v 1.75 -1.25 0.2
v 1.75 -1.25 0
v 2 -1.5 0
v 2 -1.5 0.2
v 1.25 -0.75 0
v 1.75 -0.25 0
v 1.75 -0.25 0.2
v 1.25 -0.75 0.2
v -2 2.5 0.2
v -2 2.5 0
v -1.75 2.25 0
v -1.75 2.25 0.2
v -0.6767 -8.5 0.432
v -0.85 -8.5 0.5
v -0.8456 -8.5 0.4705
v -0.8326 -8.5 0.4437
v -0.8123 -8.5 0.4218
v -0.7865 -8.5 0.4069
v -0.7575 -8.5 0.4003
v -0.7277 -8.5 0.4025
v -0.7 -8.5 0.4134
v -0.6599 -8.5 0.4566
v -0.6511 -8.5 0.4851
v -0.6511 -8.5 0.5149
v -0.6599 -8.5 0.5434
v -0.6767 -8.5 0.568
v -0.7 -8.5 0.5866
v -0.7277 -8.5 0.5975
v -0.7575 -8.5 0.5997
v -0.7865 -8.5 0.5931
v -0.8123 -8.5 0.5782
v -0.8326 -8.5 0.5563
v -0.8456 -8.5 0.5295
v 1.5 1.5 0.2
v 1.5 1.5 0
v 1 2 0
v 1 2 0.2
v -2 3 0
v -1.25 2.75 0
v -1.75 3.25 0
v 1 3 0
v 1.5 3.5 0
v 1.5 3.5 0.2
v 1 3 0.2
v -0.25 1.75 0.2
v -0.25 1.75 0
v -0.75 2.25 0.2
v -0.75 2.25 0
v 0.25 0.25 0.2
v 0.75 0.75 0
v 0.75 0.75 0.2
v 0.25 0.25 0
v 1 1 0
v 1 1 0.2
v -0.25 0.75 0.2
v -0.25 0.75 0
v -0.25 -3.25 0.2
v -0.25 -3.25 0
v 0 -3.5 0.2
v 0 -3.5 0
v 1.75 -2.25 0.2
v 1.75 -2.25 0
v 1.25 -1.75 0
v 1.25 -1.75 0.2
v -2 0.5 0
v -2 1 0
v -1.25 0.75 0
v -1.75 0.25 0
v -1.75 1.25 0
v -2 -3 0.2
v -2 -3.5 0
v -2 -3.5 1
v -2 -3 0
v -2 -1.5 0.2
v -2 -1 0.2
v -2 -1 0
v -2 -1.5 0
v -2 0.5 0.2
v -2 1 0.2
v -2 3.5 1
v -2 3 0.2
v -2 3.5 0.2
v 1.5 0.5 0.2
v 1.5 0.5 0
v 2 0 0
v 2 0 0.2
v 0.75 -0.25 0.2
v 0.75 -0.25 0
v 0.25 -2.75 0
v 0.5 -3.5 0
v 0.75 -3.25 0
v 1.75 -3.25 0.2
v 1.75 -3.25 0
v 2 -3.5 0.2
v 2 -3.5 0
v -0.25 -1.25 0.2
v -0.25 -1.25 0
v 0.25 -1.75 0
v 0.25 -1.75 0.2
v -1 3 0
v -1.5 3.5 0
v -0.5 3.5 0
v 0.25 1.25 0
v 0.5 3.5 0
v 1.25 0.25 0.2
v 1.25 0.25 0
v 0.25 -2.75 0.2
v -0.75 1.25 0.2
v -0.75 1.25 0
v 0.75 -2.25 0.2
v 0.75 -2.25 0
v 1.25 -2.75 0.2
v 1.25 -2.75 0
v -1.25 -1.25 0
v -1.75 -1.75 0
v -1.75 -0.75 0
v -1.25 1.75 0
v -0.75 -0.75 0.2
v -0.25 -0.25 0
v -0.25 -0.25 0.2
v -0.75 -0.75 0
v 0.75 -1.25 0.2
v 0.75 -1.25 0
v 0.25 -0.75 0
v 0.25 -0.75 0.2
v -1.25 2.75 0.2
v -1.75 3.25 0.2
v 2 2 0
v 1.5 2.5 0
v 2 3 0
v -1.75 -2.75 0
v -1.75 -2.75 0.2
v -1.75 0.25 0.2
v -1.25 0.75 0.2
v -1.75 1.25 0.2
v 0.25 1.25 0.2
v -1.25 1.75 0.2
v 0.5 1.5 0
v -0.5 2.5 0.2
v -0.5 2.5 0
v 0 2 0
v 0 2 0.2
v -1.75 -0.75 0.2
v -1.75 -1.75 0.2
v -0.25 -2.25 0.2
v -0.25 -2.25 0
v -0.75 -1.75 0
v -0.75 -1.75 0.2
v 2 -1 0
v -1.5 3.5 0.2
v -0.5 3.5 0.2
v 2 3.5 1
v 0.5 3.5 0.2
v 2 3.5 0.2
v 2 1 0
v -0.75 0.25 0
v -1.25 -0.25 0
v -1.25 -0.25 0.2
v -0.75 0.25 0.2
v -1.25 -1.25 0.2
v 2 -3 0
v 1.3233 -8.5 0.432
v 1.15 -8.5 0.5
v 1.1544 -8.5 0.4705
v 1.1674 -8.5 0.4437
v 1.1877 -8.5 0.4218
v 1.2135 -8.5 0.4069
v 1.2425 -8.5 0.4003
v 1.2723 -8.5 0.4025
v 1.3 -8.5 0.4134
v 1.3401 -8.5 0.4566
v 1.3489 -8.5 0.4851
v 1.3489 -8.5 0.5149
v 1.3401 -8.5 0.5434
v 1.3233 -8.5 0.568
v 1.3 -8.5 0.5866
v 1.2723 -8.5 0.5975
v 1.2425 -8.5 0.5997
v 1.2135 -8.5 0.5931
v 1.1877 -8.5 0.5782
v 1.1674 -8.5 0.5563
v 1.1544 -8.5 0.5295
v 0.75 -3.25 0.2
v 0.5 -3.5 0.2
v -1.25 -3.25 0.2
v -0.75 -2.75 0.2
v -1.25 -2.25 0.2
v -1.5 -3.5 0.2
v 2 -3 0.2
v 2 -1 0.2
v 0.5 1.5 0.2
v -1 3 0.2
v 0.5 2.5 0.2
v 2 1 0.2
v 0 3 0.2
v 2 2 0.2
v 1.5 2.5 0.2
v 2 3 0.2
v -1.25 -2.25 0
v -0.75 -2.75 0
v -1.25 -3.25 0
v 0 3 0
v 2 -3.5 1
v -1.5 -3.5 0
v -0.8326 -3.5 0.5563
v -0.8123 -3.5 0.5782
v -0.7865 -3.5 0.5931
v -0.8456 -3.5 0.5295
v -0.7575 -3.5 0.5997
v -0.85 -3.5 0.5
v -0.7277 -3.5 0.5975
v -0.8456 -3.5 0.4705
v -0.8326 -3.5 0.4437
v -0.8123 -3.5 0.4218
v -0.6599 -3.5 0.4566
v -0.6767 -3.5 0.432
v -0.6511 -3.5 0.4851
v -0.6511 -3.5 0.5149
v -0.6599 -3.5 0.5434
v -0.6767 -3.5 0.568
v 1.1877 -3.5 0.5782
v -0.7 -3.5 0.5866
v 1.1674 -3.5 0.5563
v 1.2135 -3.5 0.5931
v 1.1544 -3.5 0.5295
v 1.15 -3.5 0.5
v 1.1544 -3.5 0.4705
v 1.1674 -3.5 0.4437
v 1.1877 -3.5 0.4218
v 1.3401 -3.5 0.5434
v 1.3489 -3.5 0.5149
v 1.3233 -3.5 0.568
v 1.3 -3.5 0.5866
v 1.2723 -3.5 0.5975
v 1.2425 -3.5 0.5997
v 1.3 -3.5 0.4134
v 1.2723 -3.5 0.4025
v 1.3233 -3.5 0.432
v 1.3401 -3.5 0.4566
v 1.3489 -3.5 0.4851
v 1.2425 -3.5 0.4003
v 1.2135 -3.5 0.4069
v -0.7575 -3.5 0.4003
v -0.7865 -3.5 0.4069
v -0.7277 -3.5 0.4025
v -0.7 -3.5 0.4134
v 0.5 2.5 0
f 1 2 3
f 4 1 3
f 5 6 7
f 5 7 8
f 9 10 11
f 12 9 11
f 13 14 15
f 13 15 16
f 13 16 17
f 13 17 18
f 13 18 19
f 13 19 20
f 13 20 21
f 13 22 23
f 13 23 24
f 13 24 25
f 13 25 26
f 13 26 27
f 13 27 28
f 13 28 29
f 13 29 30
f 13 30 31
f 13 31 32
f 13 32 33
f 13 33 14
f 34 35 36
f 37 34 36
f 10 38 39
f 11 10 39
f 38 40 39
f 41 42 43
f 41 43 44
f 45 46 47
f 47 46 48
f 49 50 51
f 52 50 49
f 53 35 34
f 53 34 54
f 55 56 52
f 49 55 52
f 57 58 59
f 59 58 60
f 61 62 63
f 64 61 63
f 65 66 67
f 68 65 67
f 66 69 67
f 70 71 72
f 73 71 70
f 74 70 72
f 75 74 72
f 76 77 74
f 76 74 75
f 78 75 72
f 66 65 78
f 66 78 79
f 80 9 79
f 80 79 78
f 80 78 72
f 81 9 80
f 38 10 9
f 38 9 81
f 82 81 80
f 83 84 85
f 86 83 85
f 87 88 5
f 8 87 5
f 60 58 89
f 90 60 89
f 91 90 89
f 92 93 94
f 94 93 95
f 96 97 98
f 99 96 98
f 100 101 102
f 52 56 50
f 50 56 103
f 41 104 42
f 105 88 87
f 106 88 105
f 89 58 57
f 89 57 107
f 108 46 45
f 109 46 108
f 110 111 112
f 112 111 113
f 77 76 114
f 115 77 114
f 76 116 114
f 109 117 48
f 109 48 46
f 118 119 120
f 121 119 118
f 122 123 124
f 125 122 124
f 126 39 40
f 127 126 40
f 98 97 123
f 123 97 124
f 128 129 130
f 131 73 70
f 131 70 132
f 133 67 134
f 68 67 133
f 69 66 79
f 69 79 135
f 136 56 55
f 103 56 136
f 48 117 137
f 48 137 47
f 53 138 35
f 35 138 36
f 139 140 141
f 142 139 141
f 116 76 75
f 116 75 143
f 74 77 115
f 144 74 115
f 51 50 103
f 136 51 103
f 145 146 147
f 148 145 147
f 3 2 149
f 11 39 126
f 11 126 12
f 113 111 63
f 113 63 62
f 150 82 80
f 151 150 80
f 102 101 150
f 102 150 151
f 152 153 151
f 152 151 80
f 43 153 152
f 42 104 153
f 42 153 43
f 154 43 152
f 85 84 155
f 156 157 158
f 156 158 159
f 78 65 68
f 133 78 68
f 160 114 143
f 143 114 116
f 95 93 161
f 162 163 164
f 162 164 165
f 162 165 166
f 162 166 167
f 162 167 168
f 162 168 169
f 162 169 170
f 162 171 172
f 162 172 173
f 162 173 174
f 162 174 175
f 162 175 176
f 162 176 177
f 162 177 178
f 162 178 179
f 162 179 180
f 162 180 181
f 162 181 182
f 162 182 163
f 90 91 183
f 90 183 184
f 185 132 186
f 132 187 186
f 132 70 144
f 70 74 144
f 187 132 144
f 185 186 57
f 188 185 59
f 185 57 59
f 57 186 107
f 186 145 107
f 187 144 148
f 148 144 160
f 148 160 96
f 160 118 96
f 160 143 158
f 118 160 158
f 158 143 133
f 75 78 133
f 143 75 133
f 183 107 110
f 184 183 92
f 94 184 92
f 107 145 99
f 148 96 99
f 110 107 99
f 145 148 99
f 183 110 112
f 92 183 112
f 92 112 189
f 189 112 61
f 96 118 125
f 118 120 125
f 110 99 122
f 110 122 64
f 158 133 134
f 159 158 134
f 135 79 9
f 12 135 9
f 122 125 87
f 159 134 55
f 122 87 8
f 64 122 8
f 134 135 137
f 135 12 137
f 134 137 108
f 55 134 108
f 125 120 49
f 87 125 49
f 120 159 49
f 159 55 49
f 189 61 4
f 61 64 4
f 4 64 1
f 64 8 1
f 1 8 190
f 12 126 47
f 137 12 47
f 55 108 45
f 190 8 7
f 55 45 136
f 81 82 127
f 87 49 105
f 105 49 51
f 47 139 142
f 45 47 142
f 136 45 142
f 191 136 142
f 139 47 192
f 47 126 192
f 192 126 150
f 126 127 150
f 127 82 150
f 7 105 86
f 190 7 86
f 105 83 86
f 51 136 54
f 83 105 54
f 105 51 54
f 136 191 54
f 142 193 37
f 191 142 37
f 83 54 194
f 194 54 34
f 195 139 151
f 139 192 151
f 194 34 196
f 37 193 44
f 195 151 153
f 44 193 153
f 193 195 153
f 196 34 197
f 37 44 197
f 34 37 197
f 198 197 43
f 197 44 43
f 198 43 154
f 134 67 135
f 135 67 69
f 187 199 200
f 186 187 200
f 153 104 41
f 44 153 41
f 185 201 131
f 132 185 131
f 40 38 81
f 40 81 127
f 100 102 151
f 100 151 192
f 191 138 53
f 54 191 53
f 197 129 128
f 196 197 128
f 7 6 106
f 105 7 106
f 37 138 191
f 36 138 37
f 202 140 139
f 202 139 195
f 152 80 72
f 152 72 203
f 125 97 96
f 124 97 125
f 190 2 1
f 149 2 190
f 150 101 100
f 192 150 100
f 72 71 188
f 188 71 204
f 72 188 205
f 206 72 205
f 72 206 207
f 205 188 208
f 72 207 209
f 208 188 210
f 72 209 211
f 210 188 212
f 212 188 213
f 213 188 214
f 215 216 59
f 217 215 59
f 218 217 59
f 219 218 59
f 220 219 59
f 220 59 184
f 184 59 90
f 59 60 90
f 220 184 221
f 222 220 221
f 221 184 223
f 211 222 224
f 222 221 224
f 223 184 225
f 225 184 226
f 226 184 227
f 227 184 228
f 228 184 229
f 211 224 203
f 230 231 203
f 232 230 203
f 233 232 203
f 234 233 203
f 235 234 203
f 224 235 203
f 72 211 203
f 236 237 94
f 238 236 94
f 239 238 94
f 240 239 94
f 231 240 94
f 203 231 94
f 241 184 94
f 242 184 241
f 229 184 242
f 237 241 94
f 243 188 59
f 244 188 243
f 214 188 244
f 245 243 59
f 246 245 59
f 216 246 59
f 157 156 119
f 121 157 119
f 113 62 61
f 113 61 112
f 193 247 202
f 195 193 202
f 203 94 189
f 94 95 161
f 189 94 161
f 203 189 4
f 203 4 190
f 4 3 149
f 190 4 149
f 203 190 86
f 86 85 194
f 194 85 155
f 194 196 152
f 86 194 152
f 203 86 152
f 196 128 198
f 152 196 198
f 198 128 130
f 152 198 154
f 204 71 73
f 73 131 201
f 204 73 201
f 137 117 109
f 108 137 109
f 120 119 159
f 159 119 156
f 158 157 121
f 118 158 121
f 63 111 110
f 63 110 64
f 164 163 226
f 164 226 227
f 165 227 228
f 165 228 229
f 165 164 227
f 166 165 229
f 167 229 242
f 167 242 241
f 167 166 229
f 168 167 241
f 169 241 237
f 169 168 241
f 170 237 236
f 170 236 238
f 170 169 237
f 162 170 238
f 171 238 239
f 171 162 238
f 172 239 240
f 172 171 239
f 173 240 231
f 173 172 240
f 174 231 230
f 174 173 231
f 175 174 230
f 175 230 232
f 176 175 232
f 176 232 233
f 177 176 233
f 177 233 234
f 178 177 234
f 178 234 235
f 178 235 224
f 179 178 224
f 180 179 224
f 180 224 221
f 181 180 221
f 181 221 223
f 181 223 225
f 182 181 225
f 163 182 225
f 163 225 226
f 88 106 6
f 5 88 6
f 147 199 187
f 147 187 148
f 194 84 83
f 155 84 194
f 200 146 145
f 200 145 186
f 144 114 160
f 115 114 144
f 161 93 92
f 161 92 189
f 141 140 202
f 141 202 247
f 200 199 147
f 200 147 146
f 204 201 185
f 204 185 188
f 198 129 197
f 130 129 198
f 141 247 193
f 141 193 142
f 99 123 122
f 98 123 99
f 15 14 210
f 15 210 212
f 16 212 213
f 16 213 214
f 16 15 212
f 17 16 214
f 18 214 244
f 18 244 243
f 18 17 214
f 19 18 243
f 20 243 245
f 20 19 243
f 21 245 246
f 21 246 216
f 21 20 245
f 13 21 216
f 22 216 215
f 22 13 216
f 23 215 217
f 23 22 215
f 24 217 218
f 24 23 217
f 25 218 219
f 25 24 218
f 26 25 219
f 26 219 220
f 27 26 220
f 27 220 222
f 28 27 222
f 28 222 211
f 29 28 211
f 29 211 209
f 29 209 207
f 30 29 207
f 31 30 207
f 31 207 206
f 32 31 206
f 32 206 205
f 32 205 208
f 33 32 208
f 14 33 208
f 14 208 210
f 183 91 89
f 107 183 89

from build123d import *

# Parameters (mm, degrees)
SKETCH_1_W          = 4
SKETCH_1_H          = 7
EXTRUDE_2_DEPTH     = 1
CUT_EXTRUDE_1_DEPTH = 0.2
CUT_EXTRUDE_3_DEPTH = 0.2
SWEEP_1_PROFILE_R   = 0.1
SWEEP_2_PROFILE_R   = 0.1


with BuildPart() as part:
    # 草图1 → 凸台-拉伸2 (new body)
    with BuildSketch(Plane.XY):
        Rectangle(SKETCH_1_W, SKETCH_1_H)
    extrude(amount=EXTRUDE_2_DEPTH)

    # 草图2 → 切除-拉伸1 (cut)
    with BuildSketch(Plane(origin=(0, 0, 0), x_dir=(-1, 0, 0), z_dir=(0, 0, -1))):
        Polygon((1, -3.5), (2, -2.5), (2, -1.5), (0, -3.5), align=None)
        Polygon((-1, -3.5), (2, -0.5), (2, 0.5), (-2, -3.5), align=None)
        Polygon((-2, -2.5), (2, 1.5), (2, 2.5), (-2, -1.5), align=None)
        Polygon((2, 4), (-2, 0), (-2, -0.5), (2, 3.5), align=None)
        Polygon((-2, 1), (0.5, 3.5), (-0.5, 3.5), (-2, 2), align=None)
        Polygon((-2, 3), (-1.5, 3.5), (-2, 3.5), align=None)
    extrude(amount=-CUT_EXTRUDE_1_DEPTH, mode=Mode.SUBTRACT)

    # 草图4 → 切除-拉伸3 (cut)
    with BuildSketch(Plane.XY):
        Polygon((1, -4), (2, -3), (2, -2), (0, -4), align=None)
        Polygon((-1, -4), (2, -1), (2, 0), (-2, -4), align=None)
        Polygon((-2, -3), (2, 1), (2, 2), (-2, -2), align=None)
        Polygon((2, 4), (-2, 0), (-2, -1), (2, 3), align=None)
        Polygon((-2, 1), (1, 4), (0, 4), (-2, 2), align=None)
        Polygon((-2, 3), (-1, 4), (-2, 4), align=None)
    extrude(amount=CUT_EXTRUDE_3_DEPTH, mode=Mode.SUBTRACT)

    # 扫描1: sweep along a path in 草图5
    with BuildLine(Plane.XY.offset(0.5)) as sweep_1_path:
        Line((1.25, -3.5), (1.25, -8.5))
    # 扫描1 profile (on start of the path) → 扫描1 (sweep)
    with BuildSketch(Plane(origin=(1.25, -3.5, 0.5), x_dir=(-1, 0, 0), z_dir=(0, -1, 0))):
        Circle(SWEEP_1_PROFILE_R)
    sweep(path=sweep_1_path.line)

    # 扫描2: sweep along a path in 草图18
    with BuildLine(Plane.XY.offset(0.5)) as sweep_2_path:
        Line((-0.75, -3.5), (-0.75, -8.5))
    # 扫描2 profile (on start of the path) → 扫描2 (sweep)
    with BuildSketch(Plane(origin=(-0.75, -3.5, 0.5), x_dir=(-1, 0, 0), z_dir=(0, -1, 0))):
        Circle(SWEEP_2_PROFILE_R)
    sweep(path=sweep_2_path.line)


solid = part.part
